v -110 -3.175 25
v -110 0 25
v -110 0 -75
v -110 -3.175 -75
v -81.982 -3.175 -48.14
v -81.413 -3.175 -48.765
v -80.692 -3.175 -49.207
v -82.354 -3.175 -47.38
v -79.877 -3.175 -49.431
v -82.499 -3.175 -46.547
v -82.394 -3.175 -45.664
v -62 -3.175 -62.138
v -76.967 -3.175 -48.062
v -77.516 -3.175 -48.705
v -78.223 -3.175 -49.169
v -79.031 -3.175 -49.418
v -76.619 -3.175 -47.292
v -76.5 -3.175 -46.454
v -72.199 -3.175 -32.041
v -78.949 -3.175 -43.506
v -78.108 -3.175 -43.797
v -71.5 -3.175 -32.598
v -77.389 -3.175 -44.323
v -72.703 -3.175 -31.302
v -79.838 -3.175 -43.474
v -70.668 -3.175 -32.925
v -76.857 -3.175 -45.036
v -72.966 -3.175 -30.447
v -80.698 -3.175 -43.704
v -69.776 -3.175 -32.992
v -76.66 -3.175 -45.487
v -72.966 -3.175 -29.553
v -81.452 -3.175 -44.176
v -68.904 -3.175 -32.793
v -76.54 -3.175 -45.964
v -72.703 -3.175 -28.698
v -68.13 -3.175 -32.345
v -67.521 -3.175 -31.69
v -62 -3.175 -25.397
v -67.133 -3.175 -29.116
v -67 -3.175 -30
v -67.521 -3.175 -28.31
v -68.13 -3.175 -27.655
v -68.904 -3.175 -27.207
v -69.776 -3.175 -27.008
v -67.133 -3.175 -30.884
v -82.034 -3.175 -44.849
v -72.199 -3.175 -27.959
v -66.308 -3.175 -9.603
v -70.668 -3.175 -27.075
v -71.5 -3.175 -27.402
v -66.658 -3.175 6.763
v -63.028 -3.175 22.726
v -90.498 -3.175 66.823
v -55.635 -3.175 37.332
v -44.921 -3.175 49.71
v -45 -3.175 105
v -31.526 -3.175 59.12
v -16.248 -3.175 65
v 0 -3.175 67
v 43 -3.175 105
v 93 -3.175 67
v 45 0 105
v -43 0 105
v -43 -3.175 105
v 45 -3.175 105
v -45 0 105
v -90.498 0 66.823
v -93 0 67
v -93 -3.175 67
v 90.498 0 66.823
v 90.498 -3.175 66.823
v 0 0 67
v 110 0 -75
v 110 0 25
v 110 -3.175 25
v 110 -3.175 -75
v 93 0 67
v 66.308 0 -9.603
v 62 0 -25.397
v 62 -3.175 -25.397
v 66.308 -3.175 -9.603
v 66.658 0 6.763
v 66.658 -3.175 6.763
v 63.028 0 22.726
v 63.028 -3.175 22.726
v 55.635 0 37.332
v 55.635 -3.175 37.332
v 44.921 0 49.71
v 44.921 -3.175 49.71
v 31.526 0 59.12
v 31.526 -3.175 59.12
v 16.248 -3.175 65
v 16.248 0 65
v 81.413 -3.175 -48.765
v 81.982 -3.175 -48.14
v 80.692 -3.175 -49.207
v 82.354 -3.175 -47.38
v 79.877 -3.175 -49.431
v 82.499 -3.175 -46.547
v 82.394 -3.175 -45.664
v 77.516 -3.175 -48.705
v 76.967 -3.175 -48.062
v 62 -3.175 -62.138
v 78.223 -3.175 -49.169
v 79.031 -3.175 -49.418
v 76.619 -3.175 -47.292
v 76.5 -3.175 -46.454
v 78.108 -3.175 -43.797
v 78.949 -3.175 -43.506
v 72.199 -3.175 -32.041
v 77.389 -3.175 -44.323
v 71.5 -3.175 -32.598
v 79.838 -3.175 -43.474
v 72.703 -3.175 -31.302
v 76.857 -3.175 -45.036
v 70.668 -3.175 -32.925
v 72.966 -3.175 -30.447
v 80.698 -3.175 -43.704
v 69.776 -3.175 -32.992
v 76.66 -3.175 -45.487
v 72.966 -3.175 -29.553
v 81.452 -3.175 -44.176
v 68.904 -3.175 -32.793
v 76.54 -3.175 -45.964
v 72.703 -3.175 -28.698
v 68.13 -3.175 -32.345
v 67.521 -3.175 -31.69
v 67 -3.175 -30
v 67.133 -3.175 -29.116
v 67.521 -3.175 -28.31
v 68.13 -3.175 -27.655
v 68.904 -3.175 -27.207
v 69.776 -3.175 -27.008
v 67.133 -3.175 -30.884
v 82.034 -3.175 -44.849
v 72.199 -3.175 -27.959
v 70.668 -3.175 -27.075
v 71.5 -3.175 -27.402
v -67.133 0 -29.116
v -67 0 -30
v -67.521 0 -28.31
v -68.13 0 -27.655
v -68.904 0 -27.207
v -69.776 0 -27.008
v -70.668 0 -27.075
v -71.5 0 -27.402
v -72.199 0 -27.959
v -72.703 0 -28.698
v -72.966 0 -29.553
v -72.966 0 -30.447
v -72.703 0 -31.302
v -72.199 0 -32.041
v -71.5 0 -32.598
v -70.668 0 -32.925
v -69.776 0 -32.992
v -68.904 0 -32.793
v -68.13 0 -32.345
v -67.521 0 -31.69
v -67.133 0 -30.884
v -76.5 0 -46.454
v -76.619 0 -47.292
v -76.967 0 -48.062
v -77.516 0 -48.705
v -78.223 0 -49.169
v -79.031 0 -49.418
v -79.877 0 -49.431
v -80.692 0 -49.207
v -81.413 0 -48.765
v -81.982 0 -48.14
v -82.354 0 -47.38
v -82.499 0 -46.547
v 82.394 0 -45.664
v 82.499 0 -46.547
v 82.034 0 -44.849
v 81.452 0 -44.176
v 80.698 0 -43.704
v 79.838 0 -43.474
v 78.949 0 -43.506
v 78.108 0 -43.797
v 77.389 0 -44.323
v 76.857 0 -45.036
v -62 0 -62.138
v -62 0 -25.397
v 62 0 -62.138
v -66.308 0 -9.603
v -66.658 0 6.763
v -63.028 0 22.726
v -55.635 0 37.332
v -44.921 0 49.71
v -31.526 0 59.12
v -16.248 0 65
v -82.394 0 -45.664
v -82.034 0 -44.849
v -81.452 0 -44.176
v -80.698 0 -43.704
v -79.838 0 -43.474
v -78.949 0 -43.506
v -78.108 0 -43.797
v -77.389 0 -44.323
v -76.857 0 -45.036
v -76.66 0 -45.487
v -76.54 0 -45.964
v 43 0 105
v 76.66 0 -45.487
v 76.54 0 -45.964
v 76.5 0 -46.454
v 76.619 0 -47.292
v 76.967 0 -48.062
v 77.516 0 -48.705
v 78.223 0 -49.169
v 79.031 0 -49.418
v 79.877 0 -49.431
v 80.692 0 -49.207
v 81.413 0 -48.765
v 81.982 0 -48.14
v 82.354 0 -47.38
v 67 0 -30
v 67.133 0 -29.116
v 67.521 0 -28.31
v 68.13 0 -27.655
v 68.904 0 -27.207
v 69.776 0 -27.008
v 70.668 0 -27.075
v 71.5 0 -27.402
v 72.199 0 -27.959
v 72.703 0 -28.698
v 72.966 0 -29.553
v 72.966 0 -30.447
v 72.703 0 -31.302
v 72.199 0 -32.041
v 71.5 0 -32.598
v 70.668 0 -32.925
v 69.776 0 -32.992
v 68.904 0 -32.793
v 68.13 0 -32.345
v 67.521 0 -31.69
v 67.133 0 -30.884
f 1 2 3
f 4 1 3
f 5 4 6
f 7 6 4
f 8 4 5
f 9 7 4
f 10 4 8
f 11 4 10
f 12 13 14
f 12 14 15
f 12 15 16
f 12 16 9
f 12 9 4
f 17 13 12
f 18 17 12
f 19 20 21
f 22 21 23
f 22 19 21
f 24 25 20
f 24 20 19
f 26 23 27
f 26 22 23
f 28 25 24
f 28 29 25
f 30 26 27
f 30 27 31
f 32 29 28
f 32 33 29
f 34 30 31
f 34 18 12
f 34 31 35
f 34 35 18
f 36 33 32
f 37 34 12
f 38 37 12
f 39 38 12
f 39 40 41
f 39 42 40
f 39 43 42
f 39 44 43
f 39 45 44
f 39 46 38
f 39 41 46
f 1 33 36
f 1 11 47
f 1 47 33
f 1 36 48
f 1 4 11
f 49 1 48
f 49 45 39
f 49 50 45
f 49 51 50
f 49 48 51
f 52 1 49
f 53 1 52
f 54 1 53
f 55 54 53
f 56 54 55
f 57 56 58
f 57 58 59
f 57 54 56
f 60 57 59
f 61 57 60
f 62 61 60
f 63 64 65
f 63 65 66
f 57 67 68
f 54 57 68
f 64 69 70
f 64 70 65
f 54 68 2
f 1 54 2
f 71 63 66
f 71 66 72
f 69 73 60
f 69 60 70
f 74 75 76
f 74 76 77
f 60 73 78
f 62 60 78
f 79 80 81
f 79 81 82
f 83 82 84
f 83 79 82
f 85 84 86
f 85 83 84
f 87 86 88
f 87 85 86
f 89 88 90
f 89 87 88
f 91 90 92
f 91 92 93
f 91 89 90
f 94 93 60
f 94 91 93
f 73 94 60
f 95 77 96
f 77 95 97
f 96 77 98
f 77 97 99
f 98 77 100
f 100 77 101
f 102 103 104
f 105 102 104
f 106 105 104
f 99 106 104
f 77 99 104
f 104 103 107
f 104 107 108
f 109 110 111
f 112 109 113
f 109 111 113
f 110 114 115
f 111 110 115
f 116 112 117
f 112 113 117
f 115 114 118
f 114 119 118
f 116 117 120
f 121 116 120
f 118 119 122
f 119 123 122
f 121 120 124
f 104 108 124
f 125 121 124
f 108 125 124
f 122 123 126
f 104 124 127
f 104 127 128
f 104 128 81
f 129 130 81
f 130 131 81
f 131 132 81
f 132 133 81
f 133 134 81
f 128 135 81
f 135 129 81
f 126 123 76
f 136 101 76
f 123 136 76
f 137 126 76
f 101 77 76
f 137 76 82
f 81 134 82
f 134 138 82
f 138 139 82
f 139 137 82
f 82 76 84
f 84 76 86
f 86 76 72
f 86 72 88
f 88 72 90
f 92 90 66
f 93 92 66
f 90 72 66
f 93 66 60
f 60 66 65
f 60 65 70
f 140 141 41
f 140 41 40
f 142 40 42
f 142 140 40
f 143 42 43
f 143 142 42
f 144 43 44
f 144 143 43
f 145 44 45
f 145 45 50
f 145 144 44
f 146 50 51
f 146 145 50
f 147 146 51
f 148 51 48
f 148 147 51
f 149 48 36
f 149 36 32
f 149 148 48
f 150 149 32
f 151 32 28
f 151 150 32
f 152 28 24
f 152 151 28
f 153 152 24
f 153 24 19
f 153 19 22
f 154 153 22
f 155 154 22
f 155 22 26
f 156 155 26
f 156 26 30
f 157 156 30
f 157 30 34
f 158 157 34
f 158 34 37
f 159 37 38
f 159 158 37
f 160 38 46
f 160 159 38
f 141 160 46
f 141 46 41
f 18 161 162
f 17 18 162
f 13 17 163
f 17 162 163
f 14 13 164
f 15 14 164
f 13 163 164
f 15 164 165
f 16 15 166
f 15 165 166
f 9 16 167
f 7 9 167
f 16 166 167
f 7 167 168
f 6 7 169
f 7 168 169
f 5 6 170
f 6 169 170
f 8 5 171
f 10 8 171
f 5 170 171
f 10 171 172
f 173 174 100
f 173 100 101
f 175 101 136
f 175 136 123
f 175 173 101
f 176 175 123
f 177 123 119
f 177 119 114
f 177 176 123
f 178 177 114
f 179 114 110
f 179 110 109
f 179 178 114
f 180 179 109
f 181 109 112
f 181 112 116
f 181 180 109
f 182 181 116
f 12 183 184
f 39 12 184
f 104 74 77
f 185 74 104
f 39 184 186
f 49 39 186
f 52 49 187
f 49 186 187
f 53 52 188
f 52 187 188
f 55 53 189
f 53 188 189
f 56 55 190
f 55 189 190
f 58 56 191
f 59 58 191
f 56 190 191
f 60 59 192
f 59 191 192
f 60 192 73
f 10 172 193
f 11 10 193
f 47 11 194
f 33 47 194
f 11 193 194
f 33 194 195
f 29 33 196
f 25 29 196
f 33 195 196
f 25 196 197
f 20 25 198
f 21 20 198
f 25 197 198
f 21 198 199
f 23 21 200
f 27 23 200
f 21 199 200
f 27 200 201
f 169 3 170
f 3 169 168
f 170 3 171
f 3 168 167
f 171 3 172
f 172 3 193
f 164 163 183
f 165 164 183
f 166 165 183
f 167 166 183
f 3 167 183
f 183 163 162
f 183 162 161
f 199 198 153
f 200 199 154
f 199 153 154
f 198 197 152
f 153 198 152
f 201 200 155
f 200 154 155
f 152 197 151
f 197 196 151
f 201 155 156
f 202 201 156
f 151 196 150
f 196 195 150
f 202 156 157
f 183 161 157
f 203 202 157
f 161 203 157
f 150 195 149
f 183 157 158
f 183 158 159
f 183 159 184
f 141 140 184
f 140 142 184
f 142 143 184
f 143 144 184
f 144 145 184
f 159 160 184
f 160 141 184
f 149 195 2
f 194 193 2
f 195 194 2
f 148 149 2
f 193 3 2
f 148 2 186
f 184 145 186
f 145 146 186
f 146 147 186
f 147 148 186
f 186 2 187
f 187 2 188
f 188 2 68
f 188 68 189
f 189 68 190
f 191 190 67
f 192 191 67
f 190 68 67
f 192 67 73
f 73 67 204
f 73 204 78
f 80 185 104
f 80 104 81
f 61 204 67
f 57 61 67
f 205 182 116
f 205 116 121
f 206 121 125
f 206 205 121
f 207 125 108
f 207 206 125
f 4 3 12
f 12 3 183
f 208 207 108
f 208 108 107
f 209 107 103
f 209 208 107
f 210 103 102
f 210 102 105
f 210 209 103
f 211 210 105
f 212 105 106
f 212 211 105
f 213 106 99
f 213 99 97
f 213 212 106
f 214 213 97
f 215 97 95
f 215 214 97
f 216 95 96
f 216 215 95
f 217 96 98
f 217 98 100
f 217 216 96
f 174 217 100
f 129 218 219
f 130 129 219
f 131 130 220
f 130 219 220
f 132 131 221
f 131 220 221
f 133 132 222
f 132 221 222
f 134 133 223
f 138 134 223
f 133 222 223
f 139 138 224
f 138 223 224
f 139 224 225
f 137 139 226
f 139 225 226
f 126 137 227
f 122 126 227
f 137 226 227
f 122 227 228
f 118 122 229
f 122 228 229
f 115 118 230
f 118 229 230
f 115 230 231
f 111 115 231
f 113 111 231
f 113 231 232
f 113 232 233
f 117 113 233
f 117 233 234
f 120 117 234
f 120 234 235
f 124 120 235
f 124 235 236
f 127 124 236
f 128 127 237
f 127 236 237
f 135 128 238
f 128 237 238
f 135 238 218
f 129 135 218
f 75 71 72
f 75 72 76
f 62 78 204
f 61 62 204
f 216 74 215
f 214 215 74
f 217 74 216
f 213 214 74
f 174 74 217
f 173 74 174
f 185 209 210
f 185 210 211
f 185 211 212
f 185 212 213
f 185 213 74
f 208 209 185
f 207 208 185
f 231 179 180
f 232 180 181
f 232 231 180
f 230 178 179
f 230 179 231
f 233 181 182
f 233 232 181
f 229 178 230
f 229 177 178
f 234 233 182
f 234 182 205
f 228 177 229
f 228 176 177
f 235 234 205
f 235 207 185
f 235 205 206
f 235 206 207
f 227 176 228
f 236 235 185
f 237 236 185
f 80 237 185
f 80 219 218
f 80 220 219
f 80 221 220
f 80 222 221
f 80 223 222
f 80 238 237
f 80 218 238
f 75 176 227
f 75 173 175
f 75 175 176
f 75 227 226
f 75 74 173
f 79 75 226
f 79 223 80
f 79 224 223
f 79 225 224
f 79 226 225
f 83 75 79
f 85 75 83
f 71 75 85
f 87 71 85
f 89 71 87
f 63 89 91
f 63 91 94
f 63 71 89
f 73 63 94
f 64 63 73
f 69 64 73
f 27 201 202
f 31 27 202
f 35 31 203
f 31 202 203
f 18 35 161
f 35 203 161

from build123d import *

# Parameters (mm, degrees)
F0_R     = 3
F1_DEPTH = 3.175


with BuildPart() as f1:
    # F0 (on Front) → F1 (new body)
    with BuildSketch(Plane.XZ):
        with BuildLine():
            ThreePointArc((-62, -25.3968501984), (-55.6353707784, 37.3323655606), (0, 67))
            Line((0, 67), (93, 67))
            Line((93, 67), (43, 105))
            Line((43, 105), (-45, 105))
            Line((-45, 105), (-90.4976391801, 66.8229477445))
            Line((-90.4976391801, 66.8229477445), (-110, 25))
            Line((-110, 25), (-110, -75))
            Line((-110, -75), (-62, -62.1384387633))
            Line((-62, -62.1384387633), (-62, -25.3968501984))
        make_face()
        Polygon((-68.3660254038, -25.1698729811), (-63.1698729811, -28.1698729811), (-72.1845916068, -43.7838236568), (-80.6698729811, -58.4807621135), (-81.5358983849, -57.9807621135), (-84.4587142242, -47.0726649), (-84.8301270189, -45.6865334795), (-72.9848275573, -25.1698729811), align=None, mode=Mode.SUBTRACT)
        with BuildLine():
            Line((-72.1845916068, -43.7838236568), (-63.1698729811, -28.1698729811))
            Line((-63.1698729811, -28.1698729811), (-68.3660254038, -25.1698729811))
            Line((-68.3660254038, -25.1698729811), (-72.9848275573, -25.1698729811))
            Line((-72.9848275573, -25.1698729811), (-84.8301270189, -45.6865334795))
            Line((-84.8301270189, -45.6865334795), (-84.4587142242, -47.0726649))
            Line((-84.4587142242, -47.0726649), (-82.4985593839, -46.5474429935))
            ThreePointArc((-82.4985593839, -46.5474429935), (-80.2764571353, -43.556705193), (-76.856691238, -45.03570898))
            Line((-76.856691238, -45.03570898), (-72.1845916068, -43.7838236568))
        make_face()
        with Locations((-70, -30)):
            Circle(F0_R, mode=Mode.SUBTRACT)
        with BuildLine():
            Line((-80.6698729811, -58.4807621135), (-72.1845916068, -43.7838236568))
            Line((-72.1845916068, -43.7838236568), (-76.856691238, -45.03570898))
            ThreePointArc((-76.856691238, -45.03570898), (-76.5905390288, -45.7230205355), (-76.5, -46.4544826719))
            ThreePointArc((-76.5, -46.4544826719), (-79.4535142582, -49.4541224963), (-82.4985593839, -46.5474429935))
            Line((-82.4985593839, -46.5474429935), (-84.4587142242, -47.0726649))
            Line((-84.4587142242, -47.0726649), (-81.5358983849, -57.9807621135))
            Line((-81.5358983849, -57.9807621135), (-80.6698729811, -58.4807621135))
        make_face()
    extrude(amount=F1_DEPTH)


with BuildPart() as f2_1:
    # F2: instance of F1
    add(f1.part.mirror(Plane.YZ))


solid = Compound([f1.part, f2_1.part])
